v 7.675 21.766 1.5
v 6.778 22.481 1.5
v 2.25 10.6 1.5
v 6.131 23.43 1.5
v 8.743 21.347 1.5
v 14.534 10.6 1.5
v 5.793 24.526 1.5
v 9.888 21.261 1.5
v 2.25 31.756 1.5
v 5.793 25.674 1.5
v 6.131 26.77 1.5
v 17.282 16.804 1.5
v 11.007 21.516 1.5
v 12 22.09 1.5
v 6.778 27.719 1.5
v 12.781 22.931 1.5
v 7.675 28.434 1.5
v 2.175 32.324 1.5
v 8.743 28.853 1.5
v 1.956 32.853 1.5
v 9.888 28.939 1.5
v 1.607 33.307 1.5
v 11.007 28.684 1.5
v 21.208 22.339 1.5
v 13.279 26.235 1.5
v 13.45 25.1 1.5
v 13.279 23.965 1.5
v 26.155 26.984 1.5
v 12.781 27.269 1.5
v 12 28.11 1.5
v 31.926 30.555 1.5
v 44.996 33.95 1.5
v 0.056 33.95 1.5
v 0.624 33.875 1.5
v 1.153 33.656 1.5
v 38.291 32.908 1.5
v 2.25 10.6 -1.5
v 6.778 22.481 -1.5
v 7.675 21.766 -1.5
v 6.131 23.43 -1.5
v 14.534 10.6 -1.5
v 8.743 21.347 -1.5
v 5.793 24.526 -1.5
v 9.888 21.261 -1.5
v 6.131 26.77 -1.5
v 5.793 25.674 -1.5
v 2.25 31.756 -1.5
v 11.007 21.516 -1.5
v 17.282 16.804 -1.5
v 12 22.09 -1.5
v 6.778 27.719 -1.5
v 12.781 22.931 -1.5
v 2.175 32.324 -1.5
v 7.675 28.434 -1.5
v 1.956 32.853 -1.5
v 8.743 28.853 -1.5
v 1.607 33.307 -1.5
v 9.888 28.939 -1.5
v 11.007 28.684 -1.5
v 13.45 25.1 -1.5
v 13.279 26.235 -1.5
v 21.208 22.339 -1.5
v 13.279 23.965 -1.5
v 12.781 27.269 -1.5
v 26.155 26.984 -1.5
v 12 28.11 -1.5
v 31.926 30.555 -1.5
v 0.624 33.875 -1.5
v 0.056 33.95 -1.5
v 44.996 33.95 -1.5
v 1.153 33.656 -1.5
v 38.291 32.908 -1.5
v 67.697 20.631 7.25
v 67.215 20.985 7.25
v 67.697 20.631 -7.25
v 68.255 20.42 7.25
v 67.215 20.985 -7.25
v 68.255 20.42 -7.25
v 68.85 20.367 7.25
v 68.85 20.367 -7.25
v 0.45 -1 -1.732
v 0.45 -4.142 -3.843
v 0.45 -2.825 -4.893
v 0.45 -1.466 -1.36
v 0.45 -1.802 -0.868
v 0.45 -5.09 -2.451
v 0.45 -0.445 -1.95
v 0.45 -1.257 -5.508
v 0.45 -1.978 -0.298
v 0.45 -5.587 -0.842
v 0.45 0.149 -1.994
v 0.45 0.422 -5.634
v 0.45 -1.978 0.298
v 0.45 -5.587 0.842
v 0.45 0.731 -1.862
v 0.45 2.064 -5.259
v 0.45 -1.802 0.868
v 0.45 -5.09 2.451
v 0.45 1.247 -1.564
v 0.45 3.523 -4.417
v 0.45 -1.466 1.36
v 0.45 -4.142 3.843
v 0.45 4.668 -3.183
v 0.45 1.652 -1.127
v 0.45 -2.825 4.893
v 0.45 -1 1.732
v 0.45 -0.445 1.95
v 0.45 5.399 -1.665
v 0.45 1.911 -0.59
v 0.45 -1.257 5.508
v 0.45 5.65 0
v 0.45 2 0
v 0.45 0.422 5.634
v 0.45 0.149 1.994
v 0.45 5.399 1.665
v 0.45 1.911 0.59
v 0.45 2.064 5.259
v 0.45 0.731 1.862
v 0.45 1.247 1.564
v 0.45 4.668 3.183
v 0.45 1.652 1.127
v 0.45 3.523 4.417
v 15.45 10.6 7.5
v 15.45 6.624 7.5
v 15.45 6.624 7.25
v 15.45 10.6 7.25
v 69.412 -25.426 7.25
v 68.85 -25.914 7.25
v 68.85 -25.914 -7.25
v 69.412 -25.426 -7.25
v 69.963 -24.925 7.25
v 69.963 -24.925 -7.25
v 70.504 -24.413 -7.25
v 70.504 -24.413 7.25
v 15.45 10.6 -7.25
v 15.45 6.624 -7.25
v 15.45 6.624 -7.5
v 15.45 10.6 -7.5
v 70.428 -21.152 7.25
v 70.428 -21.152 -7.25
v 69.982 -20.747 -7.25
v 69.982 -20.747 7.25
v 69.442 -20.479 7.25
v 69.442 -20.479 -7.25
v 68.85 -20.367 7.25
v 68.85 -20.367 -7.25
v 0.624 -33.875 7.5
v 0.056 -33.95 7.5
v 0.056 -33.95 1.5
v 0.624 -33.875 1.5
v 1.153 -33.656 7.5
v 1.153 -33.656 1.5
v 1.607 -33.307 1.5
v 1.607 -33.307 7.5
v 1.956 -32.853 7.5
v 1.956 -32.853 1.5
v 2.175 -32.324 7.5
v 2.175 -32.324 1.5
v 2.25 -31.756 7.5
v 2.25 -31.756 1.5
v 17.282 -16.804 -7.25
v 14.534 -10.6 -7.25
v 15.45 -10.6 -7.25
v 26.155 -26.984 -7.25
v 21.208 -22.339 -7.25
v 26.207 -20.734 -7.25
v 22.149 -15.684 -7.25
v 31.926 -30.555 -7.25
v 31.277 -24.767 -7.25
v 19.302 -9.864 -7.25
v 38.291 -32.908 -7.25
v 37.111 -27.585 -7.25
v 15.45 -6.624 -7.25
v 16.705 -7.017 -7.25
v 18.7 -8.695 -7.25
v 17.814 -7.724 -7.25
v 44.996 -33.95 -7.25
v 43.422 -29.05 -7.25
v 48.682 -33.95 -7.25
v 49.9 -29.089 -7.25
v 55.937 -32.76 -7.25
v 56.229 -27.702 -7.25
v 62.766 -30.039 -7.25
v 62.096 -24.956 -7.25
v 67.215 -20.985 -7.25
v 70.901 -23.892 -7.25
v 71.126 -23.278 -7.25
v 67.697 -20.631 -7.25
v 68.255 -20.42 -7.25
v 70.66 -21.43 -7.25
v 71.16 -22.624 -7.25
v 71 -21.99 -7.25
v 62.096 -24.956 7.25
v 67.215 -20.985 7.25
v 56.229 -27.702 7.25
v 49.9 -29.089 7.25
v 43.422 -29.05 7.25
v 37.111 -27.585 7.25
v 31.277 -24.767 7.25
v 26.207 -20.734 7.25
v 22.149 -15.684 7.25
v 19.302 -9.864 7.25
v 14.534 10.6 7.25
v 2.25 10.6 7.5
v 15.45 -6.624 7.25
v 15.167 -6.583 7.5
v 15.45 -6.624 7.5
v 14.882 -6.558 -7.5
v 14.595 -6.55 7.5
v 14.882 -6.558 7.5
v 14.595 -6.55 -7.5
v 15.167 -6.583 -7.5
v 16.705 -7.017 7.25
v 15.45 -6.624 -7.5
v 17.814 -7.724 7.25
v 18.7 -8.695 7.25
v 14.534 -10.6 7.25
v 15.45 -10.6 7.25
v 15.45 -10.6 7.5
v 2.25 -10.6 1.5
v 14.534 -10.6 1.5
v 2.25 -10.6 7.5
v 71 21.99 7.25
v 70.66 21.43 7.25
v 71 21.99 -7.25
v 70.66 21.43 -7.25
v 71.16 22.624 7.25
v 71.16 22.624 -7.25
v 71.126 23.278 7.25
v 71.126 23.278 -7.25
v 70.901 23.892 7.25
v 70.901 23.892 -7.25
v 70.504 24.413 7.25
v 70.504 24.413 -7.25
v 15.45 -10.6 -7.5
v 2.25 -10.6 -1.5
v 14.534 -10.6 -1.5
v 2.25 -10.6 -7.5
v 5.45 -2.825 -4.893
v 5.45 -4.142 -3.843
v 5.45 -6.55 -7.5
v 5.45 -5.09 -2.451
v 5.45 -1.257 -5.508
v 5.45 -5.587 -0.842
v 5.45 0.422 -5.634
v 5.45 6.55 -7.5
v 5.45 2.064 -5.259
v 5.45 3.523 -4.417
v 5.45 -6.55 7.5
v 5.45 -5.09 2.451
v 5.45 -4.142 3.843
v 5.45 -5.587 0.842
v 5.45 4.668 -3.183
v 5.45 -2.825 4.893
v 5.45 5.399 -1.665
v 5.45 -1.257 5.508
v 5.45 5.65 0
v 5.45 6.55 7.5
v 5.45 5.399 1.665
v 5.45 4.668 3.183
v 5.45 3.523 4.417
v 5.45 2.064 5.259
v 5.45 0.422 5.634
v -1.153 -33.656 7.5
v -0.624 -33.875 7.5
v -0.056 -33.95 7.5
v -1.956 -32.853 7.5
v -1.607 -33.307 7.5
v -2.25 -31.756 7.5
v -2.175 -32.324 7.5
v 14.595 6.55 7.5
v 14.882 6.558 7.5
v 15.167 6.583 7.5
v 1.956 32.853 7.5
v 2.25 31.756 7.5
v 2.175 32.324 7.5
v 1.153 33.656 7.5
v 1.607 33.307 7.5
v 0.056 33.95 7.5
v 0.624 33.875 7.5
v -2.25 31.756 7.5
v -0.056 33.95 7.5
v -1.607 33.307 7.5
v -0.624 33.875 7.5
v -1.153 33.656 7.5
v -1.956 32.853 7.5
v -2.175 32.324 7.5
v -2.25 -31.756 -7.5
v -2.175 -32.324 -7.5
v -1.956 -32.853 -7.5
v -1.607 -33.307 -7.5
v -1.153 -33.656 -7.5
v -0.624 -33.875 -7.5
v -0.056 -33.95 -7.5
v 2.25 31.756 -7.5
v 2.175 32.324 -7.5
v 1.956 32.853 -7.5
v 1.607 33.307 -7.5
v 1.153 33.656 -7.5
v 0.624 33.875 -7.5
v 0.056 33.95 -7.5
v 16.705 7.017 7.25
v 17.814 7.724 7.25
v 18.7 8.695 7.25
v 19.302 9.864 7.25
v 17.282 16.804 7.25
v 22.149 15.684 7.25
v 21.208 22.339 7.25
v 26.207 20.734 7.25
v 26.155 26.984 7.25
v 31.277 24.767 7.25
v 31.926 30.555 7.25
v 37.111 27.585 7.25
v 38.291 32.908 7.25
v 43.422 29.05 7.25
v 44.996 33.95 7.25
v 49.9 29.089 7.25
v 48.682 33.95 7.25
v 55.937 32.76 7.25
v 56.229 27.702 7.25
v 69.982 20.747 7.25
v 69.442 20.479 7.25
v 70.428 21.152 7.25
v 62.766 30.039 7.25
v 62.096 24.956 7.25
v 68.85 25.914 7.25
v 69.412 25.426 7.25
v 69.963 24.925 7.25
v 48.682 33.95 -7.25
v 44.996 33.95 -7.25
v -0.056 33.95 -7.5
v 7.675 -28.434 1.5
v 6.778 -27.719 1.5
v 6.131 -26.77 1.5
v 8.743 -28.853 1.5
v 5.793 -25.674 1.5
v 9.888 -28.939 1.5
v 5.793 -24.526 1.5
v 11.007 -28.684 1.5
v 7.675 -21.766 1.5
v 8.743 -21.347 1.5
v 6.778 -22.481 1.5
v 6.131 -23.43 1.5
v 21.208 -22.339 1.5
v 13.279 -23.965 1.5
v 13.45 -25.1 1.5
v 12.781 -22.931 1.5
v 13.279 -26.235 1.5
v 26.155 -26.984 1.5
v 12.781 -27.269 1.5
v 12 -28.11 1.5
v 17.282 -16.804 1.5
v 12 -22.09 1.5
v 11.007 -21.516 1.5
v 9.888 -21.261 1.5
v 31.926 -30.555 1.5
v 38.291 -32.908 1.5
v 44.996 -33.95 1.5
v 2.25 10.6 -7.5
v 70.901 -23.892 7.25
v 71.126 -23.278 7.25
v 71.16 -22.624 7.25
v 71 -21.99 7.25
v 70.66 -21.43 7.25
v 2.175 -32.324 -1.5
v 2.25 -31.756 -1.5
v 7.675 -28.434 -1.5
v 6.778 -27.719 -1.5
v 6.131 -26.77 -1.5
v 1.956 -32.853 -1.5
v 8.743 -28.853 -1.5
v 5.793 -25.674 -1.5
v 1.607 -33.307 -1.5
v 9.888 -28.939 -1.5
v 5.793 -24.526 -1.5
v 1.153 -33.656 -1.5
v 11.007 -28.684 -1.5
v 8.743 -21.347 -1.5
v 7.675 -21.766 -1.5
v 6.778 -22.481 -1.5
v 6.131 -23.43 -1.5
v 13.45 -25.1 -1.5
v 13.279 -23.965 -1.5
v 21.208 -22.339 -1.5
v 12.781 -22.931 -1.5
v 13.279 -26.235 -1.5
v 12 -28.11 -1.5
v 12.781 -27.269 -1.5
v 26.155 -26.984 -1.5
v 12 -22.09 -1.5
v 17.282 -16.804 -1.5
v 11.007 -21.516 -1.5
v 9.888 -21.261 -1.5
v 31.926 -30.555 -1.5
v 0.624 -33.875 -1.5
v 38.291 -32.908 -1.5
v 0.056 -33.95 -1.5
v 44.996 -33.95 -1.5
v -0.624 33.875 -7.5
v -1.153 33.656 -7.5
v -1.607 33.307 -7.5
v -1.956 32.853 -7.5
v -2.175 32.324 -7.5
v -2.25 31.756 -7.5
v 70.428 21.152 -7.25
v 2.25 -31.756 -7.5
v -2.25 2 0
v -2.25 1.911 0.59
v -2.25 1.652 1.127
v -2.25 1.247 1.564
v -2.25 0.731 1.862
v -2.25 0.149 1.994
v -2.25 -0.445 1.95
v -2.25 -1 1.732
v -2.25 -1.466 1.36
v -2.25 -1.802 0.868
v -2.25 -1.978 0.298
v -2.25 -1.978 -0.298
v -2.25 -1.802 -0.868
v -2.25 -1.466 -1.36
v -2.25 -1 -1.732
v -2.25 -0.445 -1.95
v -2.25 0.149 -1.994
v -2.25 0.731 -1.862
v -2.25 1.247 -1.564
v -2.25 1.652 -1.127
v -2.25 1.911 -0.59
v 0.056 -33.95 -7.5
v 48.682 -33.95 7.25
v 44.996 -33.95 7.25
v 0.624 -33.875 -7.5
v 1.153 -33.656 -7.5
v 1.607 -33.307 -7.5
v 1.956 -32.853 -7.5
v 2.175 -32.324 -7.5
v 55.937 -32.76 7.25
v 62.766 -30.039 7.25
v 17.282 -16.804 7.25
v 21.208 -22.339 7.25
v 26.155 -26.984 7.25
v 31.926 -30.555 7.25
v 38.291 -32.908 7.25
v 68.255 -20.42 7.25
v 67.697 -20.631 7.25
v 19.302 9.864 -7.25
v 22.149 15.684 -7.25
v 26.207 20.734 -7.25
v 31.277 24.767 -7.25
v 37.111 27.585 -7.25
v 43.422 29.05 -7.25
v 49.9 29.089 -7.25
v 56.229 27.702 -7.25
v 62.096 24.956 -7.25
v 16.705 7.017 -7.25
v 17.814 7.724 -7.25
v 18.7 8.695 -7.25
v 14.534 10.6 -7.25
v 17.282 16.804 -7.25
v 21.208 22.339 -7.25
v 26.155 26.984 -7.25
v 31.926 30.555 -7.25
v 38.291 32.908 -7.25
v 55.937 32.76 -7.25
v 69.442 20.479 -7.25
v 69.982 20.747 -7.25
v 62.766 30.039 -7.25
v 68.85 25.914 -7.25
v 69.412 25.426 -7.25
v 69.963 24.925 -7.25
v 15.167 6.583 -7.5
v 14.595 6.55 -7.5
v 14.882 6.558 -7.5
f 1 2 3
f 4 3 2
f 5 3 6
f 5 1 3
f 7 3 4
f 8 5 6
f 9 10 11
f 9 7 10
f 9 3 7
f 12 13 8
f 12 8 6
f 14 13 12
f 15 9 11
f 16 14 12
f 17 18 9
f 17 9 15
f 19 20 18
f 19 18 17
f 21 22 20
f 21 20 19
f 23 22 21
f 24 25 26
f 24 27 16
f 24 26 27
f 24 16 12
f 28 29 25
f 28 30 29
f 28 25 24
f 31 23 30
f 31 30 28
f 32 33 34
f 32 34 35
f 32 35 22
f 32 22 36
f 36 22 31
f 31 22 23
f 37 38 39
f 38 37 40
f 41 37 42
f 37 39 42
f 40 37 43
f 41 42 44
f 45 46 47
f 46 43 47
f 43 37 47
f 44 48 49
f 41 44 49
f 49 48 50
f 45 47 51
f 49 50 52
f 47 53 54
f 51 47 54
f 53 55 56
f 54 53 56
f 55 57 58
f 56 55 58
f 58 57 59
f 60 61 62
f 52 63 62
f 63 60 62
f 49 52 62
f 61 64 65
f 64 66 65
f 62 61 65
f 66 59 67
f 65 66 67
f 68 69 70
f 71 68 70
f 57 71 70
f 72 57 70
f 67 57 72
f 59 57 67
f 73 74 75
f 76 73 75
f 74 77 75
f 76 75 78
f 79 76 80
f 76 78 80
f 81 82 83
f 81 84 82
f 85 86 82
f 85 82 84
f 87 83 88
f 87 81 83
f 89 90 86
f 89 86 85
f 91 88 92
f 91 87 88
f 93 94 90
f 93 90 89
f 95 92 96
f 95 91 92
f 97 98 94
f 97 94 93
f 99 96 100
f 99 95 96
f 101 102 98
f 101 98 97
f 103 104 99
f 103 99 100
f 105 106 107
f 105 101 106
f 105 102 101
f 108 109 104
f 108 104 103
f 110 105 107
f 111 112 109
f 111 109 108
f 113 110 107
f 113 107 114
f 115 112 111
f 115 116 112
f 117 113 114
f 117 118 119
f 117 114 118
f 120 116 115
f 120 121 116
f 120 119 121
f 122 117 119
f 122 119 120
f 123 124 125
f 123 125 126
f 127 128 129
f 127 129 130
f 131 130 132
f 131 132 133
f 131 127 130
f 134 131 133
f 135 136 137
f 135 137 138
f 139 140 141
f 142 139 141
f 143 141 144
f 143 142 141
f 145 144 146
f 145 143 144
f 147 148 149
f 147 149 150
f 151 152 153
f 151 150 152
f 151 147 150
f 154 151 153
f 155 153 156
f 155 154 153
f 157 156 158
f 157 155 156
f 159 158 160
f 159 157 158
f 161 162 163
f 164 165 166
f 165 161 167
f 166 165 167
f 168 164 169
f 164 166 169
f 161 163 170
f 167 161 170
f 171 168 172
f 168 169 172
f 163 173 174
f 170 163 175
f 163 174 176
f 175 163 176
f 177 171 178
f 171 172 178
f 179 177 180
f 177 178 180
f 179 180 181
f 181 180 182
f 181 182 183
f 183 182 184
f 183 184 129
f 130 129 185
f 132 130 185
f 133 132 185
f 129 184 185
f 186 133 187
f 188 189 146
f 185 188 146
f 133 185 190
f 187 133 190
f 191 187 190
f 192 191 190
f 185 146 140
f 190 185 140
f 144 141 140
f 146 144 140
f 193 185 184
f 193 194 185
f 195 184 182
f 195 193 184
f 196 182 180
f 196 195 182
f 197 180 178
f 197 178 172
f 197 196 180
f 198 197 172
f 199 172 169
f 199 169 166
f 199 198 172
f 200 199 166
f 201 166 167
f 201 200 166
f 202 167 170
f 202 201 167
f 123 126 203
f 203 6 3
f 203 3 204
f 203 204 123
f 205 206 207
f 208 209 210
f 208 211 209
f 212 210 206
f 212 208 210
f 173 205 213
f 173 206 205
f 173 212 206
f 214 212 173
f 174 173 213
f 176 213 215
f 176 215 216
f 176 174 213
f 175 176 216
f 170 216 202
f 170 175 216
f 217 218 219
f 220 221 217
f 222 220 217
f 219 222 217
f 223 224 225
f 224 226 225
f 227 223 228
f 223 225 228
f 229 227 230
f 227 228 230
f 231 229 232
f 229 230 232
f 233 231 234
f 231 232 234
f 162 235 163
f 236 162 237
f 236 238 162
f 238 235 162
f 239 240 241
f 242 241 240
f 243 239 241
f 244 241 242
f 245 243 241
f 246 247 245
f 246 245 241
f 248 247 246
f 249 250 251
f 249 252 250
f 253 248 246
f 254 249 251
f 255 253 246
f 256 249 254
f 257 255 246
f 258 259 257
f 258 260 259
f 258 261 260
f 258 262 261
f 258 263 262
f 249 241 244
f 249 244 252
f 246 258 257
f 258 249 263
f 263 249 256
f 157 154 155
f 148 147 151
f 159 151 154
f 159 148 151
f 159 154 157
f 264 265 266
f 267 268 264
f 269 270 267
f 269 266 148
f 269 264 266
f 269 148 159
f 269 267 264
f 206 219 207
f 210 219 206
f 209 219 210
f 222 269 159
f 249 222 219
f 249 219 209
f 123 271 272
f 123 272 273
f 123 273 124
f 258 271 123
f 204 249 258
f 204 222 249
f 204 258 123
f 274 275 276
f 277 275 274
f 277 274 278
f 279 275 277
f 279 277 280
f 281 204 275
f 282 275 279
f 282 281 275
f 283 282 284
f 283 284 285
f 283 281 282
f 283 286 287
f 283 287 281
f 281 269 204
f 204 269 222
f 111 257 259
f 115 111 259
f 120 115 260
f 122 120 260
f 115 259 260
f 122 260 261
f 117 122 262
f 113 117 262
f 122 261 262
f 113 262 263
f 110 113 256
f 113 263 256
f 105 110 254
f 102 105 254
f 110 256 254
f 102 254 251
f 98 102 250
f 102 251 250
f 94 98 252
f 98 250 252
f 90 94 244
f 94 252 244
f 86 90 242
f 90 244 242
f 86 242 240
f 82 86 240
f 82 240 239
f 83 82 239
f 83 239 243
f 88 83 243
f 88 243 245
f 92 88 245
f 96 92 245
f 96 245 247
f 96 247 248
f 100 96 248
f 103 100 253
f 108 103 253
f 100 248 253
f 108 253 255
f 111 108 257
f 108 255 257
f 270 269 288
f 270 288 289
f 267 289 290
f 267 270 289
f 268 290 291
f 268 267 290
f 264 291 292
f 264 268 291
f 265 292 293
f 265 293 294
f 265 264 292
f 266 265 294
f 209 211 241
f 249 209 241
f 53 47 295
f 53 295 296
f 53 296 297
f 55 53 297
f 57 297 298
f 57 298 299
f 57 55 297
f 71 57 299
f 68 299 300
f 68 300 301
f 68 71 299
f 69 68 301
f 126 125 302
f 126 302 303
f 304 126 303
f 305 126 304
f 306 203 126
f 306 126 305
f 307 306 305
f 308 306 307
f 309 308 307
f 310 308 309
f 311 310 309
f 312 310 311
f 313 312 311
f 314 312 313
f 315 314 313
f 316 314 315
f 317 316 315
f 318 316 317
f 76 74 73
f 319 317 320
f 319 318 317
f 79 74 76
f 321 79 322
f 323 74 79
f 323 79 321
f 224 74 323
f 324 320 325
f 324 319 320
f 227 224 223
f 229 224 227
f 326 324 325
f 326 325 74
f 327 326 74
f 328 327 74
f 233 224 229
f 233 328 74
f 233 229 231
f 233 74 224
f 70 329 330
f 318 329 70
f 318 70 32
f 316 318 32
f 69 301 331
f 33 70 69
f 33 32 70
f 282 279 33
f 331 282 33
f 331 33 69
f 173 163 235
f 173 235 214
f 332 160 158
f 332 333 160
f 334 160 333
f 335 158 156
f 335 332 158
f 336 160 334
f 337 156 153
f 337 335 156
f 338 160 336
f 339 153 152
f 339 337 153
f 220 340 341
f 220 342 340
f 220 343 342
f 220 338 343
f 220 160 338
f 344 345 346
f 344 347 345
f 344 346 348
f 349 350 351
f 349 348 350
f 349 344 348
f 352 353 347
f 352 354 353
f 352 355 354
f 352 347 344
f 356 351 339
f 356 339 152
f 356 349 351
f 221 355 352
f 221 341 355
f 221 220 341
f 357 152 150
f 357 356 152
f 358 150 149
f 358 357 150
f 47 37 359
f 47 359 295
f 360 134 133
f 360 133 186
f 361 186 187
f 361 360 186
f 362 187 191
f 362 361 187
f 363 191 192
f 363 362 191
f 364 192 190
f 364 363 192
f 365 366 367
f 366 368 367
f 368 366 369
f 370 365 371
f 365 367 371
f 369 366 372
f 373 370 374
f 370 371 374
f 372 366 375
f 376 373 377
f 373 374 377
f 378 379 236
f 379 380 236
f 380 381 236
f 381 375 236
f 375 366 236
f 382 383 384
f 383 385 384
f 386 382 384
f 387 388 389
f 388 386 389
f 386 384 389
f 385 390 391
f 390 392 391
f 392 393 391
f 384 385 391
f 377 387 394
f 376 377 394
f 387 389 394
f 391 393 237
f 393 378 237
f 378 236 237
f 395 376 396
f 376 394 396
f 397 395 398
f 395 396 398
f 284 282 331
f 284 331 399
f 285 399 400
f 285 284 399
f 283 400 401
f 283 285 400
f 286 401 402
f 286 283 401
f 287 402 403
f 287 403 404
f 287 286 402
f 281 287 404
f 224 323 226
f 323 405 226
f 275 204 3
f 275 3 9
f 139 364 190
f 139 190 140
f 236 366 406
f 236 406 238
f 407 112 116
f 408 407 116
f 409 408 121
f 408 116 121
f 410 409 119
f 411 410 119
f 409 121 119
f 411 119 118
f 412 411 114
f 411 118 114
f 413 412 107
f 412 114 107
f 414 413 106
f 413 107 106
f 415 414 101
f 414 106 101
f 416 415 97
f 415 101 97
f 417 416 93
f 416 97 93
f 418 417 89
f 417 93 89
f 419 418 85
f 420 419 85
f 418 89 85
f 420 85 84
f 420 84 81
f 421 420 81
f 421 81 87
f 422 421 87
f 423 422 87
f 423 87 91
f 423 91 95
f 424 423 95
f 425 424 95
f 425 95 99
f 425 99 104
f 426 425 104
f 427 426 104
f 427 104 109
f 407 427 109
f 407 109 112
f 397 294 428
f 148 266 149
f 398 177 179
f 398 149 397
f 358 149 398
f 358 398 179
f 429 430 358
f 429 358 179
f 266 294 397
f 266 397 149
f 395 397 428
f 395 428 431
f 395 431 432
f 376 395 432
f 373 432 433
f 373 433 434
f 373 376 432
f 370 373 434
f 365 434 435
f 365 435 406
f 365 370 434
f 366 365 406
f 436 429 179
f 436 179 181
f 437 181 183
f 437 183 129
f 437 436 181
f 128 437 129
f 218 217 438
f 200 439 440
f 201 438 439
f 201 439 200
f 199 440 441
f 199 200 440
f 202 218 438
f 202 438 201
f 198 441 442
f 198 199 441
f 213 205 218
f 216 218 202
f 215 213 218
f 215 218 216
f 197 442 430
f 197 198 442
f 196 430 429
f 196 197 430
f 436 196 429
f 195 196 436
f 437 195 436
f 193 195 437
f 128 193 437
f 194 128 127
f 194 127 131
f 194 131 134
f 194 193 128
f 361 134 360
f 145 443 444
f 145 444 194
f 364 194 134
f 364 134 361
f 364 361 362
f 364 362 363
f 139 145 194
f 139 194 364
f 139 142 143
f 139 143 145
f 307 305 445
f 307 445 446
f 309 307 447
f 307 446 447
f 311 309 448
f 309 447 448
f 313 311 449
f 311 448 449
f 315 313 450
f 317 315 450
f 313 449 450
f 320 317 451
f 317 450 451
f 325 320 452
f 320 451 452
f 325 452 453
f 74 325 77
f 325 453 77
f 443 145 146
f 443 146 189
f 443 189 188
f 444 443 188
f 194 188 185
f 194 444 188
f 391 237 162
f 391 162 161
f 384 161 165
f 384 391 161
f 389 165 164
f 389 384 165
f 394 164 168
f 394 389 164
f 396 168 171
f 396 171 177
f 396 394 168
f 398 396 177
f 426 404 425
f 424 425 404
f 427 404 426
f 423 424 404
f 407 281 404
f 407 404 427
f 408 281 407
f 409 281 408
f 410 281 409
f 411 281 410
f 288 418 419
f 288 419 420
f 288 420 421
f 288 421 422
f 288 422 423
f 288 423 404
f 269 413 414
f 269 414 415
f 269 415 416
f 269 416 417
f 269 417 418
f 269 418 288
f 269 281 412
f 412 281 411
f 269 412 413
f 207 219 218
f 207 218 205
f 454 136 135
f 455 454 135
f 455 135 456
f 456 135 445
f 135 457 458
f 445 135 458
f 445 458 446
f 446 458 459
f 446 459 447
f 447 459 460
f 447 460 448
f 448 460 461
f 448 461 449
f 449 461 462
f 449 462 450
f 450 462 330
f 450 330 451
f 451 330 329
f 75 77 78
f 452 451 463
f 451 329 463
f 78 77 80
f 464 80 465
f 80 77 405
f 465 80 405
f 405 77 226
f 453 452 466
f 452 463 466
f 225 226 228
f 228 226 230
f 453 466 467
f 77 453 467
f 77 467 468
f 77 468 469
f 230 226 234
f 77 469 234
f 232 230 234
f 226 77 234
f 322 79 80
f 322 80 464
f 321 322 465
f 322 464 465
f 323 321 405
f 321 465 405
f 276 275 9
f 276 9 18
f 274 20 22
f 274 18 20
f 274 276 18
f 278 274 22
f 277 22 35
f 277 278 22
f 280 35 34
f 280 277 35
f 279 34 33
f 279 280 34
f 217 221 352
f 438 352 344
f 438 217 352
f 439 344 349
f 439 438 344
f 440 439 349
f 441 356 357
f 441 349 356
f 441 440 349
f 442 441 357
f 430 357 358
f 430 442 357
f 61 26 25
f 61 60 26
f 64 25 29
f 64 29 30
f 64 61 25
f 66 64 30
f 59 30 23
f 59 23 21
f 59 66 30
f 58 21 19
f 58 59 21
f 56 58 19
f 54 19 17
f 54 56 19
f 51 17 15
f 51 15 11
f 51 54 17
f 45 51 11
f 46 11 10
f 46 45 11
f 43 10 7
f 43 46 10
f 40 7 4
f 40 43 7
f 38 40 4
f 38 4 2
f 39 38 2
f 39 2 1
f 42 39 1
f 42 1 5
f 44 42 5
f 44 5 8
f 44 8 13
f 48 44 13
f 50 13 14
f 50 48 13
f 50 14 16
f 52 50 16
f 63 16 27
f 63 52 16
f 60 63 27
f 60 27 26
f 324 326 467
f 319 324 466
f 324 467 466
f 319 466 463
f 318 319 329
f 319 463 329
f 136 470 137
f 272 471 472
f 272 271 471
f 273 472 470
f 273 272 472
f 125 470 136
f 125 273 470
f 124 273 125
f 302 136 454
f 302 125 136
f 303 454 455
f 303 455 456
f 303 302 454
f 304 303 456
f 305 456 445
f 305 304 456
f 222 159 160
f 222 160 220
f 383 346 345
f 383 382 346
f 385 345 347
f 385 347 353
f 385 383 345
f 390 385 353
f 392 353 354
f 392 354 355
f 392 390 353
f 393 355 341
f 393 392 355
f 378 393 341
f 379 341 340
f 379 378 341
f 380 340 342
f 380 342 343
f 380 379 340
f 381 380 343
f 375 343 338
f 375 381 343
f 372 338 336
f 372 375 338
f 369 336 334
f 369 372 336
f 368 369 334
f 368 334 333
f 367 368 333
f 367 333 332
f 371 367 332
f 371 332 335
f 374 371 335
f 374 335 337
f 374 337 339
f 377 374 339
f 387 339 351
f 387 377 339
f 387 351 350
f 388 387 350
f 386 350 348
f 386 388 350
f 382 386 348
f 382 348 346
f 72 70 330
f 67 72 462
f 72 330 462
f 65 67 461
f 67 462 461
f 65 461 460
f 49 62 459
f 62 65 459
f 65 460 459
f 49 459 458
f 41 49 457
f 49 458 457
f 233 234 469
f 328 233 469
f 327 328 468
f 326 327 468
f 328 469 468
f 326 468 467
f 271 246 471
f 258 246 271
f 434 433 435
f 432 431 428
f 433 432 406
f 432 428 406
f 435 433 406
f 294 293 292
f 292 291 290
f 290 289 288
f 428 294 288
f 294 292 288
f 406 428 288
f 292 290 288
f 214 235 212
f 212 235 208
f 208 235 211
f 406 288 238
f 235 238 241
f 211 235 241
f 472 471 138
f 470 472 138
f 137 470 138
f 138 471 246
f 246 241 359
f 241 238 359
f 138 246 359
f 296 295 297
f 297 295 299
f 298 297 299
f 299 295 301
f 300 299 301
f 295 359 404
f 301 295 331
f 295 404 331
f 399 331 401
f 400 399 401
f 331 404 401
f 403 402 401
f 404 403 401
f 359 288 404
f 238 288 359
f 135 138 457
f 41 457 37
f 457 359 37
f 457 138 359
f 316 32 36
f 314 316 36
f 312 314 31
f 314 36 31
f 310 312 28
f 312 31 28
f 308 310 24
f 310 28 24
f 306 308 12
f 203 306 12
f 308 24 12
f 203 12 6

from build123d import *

# Parameters (mm, degrees)
F1_DEPTH  = 7.5
F2_W      = 21.2
F2_H      = 15
F3_DEPTH  = 5.45
F4_W      = 4.05
F4_H      = 15
F5_DEPTH  = 10
F6_R      = 3.85
F7_DEPTH  = 1.5
F8_DEPTH  = 7.25
F9_R      = 5
F10_R     = 5.65
F11_DEPTH = 5
F12_R     = 2
F13_DEPTH = 25


with BuildPart() as f1:
    # F0 (on Top) → F1 (new body, symmetric)
    with BuildSketch(Plane.XY):
        with BuildLine():
            ThreePointArc((2.25, 31.755662), (1.607293, 33.307293), (0.055662, 33.95))
            Line((0.055662, 33.95), (-0.055662, 33.95))
            ThreePointArc((-0.055662, 33.95), (-1.607293, 33.307293), (-2.25, 31.755662))
            Line((-2.25, 31.755662), (-2.25, -31.755662))
            ThreePointArc((-2.25, -31.755662), (-1.607293, -33.307293), (-0.055662, -33.95))
            Line((-0.055662, -33.95), (0.055662, -33.95))
            ThreePointArc((0.055662, -33.95), (1.607293, -33.307293), (2.25, -31.755662))
            Line((2.25, -31.755662), (2.25, 31.755662))
        make_face()
    extrude(amount=F1_DEPTH, both=True)

    # F2 (on Right) → F3 (join)
    with BuildSketch(Plane.YZ):
        Rectangle(F2_W, F2_H)
    extrude(amount=F3_DEPTH)

    # F4 (on face) → F5 (join)
    with BuildSketch(Plane.YZ.offset(5.45)):
        with Locations((8.575, 0)):
            Rectangle(F4_W, F4_H)
        with Locations((-8.575, 0)):
            Rectangle(F4_W, F4_H)
    extrude(amount=F5_DEPTH)

    # F6 (on Top) → F7 (join, symmetric)
    with BuildSketch(Plane.XY):
        with BuildLine():
            Line((44.995906, 33.95), (0.055662, 33.95))
            ThreePointArc((0.055662, 33.95), (1.607293, 33.307293), (2.25, 31.755662))
            Line((2.25, 31.755662), (2.25, 10.6))
            Line((2.25, 10.6), (14.533719, 10.6))
            ThreePointArc((14.533719, 10.6), (26.154887, 26.984474), (44.995906, 33.95))
        make_face()
        with Locations((9.6, 25.1)):
            Circle(F6_R, mode=Mode.SUBTRACT)
        with BuildLine():
            Line((2.25, -10.6), (2.25, -31.755662))
            ThreePointArc((2.25, -31.755662), (1.607293, -33.307293), (0.055662, -33.95))
            Line((0.055662, -33.95), (44.995906, -33.95))
            ThreePointArc((44.995906, -33.95), (26.154887, -26.984474), (14.533719, -10.6))
            Line((14.533719, -10.6), (2.25, -10.6))
        make_face()
        with Locations((9.6, -25.1)):
            Circle(F6_R, mode=Mode.SUBTRACT)
    extrude(amount=F7_DEPTH, both=True)

    # F6 (on Top) → F8 (join, symmetric)
    with BuildSketch(Plane.XY):
        with BuildLine():
            Line((48.682367, 33.95), (44.995906, 33.95))
            ThreePointArc((44.995906, 33.95), (26.154887, 26.984474), (14.533719, 10.6))
            Line((14.533719, 10.6), (15.45, 10.6))
            Line((15.45, 10.6), (15.45, 6.55))
            Line((15.45, 6.55), (18.331945, 6.55))
            ThreePointArc((18.331945, 6.55), (38.555461, 28.052508), (67.215495, 20.984912))
            ThreePointArc((67.215495, 20.984912), (67.968637, 20.506465), (68.85, 20.367419))
            Line((68.85, 20.367419), (68.85, 25.913739))
            ThreePointArc((68.85, 25.913739), (59.424836, 31.584809), (48.682367, 33.95))
        make_face()
        with BuildLine():
            Line((15.45, -10.6), (14.533719, -10.6))
            ThreePointArc((14.533719, -10.6), (26.154887, -26.984474), (44.995906, -33.95))
            Line((44.995906, -33.95), (48.682367, -33.95))
            ThreePointArc((48.682367, -33.95), (59.424836, -31.584809), (68.85, -25.913739))
            Line((68.85, -25.913739), (68.85, -20.367419))
            ThreePointArc((68.85, -20.367419), (67.968637, -20.506465), (67.215495, -20.984912))
            ThreePointArc((67.215495, -20.984912), (38.555461, -28.052508), (18.331945, -6.55))
            Line((18.331945, -6.55), (15.45, -6.55))
            Line((15.45, -6.55), (15.45, -10.6))
        make_face()
        with BuildLine():
            ThreePointArc((70.503742, 24.412834), (69.689198, 25.176869), (68.85, 25.913739))
            Line((68.85, 25.913739), (68.85, 20.367419))
            ThreePointArc((68.85, 20.367419), (69.721282, 20.594438), (70.428051, 21.152243))
            Line((70.428051, 21.152243), (70.660364, 21.430287))
            ThreePointArc((70.660364, 21.430287), (71.167762, 22.952317), (70.503742, 24.412834))
        make_face()
        with BuildLine():
            Line((68.85, -20.367419), (68.85, -25.913739))
            ThreePointArc((68.85, -25.913739), (69.689198, -25.176869), (70.503742, -24.412834))
            ThreePointArc((70.503742, -24.412834), (71.167762, -22.952317), (70.660364, -21.430287))
            Line((70.660364, -21.430287), (70.428051, -21.152243))
            ThreePointArc((70.428051, -21.152243), (69.721282, -20.594438), (68.85, -20.367419))
        make_face()
    extrude(amount=F8_DEPTH, both=True)

    # F9
    f9_edges = [f1.edges().sort_by_distance(p)[0] for p in [
        (18.331945, 6.55, 0),
        (18.331945, -6.55, 0),
    ]]
    fillet(f9_edges, radius=F9_R)

    # F10 (on face) → F11 (cut)
    with BuildSketch(Plane.YZ.offset(5.45)):
        Circle(F10_R)
    extrude(amount=-F11_DEPTH, mode=Mode.SUBTRACT)

    # F12 (on face) → F13 (cut)
    with BuildSketch(Plane.YZ.offset(0.45)):
        Circle(F12_R)
    extrude(amount=-F13_DEPTH, mode=Mode.SUBTRACT)


solid = f1.part
